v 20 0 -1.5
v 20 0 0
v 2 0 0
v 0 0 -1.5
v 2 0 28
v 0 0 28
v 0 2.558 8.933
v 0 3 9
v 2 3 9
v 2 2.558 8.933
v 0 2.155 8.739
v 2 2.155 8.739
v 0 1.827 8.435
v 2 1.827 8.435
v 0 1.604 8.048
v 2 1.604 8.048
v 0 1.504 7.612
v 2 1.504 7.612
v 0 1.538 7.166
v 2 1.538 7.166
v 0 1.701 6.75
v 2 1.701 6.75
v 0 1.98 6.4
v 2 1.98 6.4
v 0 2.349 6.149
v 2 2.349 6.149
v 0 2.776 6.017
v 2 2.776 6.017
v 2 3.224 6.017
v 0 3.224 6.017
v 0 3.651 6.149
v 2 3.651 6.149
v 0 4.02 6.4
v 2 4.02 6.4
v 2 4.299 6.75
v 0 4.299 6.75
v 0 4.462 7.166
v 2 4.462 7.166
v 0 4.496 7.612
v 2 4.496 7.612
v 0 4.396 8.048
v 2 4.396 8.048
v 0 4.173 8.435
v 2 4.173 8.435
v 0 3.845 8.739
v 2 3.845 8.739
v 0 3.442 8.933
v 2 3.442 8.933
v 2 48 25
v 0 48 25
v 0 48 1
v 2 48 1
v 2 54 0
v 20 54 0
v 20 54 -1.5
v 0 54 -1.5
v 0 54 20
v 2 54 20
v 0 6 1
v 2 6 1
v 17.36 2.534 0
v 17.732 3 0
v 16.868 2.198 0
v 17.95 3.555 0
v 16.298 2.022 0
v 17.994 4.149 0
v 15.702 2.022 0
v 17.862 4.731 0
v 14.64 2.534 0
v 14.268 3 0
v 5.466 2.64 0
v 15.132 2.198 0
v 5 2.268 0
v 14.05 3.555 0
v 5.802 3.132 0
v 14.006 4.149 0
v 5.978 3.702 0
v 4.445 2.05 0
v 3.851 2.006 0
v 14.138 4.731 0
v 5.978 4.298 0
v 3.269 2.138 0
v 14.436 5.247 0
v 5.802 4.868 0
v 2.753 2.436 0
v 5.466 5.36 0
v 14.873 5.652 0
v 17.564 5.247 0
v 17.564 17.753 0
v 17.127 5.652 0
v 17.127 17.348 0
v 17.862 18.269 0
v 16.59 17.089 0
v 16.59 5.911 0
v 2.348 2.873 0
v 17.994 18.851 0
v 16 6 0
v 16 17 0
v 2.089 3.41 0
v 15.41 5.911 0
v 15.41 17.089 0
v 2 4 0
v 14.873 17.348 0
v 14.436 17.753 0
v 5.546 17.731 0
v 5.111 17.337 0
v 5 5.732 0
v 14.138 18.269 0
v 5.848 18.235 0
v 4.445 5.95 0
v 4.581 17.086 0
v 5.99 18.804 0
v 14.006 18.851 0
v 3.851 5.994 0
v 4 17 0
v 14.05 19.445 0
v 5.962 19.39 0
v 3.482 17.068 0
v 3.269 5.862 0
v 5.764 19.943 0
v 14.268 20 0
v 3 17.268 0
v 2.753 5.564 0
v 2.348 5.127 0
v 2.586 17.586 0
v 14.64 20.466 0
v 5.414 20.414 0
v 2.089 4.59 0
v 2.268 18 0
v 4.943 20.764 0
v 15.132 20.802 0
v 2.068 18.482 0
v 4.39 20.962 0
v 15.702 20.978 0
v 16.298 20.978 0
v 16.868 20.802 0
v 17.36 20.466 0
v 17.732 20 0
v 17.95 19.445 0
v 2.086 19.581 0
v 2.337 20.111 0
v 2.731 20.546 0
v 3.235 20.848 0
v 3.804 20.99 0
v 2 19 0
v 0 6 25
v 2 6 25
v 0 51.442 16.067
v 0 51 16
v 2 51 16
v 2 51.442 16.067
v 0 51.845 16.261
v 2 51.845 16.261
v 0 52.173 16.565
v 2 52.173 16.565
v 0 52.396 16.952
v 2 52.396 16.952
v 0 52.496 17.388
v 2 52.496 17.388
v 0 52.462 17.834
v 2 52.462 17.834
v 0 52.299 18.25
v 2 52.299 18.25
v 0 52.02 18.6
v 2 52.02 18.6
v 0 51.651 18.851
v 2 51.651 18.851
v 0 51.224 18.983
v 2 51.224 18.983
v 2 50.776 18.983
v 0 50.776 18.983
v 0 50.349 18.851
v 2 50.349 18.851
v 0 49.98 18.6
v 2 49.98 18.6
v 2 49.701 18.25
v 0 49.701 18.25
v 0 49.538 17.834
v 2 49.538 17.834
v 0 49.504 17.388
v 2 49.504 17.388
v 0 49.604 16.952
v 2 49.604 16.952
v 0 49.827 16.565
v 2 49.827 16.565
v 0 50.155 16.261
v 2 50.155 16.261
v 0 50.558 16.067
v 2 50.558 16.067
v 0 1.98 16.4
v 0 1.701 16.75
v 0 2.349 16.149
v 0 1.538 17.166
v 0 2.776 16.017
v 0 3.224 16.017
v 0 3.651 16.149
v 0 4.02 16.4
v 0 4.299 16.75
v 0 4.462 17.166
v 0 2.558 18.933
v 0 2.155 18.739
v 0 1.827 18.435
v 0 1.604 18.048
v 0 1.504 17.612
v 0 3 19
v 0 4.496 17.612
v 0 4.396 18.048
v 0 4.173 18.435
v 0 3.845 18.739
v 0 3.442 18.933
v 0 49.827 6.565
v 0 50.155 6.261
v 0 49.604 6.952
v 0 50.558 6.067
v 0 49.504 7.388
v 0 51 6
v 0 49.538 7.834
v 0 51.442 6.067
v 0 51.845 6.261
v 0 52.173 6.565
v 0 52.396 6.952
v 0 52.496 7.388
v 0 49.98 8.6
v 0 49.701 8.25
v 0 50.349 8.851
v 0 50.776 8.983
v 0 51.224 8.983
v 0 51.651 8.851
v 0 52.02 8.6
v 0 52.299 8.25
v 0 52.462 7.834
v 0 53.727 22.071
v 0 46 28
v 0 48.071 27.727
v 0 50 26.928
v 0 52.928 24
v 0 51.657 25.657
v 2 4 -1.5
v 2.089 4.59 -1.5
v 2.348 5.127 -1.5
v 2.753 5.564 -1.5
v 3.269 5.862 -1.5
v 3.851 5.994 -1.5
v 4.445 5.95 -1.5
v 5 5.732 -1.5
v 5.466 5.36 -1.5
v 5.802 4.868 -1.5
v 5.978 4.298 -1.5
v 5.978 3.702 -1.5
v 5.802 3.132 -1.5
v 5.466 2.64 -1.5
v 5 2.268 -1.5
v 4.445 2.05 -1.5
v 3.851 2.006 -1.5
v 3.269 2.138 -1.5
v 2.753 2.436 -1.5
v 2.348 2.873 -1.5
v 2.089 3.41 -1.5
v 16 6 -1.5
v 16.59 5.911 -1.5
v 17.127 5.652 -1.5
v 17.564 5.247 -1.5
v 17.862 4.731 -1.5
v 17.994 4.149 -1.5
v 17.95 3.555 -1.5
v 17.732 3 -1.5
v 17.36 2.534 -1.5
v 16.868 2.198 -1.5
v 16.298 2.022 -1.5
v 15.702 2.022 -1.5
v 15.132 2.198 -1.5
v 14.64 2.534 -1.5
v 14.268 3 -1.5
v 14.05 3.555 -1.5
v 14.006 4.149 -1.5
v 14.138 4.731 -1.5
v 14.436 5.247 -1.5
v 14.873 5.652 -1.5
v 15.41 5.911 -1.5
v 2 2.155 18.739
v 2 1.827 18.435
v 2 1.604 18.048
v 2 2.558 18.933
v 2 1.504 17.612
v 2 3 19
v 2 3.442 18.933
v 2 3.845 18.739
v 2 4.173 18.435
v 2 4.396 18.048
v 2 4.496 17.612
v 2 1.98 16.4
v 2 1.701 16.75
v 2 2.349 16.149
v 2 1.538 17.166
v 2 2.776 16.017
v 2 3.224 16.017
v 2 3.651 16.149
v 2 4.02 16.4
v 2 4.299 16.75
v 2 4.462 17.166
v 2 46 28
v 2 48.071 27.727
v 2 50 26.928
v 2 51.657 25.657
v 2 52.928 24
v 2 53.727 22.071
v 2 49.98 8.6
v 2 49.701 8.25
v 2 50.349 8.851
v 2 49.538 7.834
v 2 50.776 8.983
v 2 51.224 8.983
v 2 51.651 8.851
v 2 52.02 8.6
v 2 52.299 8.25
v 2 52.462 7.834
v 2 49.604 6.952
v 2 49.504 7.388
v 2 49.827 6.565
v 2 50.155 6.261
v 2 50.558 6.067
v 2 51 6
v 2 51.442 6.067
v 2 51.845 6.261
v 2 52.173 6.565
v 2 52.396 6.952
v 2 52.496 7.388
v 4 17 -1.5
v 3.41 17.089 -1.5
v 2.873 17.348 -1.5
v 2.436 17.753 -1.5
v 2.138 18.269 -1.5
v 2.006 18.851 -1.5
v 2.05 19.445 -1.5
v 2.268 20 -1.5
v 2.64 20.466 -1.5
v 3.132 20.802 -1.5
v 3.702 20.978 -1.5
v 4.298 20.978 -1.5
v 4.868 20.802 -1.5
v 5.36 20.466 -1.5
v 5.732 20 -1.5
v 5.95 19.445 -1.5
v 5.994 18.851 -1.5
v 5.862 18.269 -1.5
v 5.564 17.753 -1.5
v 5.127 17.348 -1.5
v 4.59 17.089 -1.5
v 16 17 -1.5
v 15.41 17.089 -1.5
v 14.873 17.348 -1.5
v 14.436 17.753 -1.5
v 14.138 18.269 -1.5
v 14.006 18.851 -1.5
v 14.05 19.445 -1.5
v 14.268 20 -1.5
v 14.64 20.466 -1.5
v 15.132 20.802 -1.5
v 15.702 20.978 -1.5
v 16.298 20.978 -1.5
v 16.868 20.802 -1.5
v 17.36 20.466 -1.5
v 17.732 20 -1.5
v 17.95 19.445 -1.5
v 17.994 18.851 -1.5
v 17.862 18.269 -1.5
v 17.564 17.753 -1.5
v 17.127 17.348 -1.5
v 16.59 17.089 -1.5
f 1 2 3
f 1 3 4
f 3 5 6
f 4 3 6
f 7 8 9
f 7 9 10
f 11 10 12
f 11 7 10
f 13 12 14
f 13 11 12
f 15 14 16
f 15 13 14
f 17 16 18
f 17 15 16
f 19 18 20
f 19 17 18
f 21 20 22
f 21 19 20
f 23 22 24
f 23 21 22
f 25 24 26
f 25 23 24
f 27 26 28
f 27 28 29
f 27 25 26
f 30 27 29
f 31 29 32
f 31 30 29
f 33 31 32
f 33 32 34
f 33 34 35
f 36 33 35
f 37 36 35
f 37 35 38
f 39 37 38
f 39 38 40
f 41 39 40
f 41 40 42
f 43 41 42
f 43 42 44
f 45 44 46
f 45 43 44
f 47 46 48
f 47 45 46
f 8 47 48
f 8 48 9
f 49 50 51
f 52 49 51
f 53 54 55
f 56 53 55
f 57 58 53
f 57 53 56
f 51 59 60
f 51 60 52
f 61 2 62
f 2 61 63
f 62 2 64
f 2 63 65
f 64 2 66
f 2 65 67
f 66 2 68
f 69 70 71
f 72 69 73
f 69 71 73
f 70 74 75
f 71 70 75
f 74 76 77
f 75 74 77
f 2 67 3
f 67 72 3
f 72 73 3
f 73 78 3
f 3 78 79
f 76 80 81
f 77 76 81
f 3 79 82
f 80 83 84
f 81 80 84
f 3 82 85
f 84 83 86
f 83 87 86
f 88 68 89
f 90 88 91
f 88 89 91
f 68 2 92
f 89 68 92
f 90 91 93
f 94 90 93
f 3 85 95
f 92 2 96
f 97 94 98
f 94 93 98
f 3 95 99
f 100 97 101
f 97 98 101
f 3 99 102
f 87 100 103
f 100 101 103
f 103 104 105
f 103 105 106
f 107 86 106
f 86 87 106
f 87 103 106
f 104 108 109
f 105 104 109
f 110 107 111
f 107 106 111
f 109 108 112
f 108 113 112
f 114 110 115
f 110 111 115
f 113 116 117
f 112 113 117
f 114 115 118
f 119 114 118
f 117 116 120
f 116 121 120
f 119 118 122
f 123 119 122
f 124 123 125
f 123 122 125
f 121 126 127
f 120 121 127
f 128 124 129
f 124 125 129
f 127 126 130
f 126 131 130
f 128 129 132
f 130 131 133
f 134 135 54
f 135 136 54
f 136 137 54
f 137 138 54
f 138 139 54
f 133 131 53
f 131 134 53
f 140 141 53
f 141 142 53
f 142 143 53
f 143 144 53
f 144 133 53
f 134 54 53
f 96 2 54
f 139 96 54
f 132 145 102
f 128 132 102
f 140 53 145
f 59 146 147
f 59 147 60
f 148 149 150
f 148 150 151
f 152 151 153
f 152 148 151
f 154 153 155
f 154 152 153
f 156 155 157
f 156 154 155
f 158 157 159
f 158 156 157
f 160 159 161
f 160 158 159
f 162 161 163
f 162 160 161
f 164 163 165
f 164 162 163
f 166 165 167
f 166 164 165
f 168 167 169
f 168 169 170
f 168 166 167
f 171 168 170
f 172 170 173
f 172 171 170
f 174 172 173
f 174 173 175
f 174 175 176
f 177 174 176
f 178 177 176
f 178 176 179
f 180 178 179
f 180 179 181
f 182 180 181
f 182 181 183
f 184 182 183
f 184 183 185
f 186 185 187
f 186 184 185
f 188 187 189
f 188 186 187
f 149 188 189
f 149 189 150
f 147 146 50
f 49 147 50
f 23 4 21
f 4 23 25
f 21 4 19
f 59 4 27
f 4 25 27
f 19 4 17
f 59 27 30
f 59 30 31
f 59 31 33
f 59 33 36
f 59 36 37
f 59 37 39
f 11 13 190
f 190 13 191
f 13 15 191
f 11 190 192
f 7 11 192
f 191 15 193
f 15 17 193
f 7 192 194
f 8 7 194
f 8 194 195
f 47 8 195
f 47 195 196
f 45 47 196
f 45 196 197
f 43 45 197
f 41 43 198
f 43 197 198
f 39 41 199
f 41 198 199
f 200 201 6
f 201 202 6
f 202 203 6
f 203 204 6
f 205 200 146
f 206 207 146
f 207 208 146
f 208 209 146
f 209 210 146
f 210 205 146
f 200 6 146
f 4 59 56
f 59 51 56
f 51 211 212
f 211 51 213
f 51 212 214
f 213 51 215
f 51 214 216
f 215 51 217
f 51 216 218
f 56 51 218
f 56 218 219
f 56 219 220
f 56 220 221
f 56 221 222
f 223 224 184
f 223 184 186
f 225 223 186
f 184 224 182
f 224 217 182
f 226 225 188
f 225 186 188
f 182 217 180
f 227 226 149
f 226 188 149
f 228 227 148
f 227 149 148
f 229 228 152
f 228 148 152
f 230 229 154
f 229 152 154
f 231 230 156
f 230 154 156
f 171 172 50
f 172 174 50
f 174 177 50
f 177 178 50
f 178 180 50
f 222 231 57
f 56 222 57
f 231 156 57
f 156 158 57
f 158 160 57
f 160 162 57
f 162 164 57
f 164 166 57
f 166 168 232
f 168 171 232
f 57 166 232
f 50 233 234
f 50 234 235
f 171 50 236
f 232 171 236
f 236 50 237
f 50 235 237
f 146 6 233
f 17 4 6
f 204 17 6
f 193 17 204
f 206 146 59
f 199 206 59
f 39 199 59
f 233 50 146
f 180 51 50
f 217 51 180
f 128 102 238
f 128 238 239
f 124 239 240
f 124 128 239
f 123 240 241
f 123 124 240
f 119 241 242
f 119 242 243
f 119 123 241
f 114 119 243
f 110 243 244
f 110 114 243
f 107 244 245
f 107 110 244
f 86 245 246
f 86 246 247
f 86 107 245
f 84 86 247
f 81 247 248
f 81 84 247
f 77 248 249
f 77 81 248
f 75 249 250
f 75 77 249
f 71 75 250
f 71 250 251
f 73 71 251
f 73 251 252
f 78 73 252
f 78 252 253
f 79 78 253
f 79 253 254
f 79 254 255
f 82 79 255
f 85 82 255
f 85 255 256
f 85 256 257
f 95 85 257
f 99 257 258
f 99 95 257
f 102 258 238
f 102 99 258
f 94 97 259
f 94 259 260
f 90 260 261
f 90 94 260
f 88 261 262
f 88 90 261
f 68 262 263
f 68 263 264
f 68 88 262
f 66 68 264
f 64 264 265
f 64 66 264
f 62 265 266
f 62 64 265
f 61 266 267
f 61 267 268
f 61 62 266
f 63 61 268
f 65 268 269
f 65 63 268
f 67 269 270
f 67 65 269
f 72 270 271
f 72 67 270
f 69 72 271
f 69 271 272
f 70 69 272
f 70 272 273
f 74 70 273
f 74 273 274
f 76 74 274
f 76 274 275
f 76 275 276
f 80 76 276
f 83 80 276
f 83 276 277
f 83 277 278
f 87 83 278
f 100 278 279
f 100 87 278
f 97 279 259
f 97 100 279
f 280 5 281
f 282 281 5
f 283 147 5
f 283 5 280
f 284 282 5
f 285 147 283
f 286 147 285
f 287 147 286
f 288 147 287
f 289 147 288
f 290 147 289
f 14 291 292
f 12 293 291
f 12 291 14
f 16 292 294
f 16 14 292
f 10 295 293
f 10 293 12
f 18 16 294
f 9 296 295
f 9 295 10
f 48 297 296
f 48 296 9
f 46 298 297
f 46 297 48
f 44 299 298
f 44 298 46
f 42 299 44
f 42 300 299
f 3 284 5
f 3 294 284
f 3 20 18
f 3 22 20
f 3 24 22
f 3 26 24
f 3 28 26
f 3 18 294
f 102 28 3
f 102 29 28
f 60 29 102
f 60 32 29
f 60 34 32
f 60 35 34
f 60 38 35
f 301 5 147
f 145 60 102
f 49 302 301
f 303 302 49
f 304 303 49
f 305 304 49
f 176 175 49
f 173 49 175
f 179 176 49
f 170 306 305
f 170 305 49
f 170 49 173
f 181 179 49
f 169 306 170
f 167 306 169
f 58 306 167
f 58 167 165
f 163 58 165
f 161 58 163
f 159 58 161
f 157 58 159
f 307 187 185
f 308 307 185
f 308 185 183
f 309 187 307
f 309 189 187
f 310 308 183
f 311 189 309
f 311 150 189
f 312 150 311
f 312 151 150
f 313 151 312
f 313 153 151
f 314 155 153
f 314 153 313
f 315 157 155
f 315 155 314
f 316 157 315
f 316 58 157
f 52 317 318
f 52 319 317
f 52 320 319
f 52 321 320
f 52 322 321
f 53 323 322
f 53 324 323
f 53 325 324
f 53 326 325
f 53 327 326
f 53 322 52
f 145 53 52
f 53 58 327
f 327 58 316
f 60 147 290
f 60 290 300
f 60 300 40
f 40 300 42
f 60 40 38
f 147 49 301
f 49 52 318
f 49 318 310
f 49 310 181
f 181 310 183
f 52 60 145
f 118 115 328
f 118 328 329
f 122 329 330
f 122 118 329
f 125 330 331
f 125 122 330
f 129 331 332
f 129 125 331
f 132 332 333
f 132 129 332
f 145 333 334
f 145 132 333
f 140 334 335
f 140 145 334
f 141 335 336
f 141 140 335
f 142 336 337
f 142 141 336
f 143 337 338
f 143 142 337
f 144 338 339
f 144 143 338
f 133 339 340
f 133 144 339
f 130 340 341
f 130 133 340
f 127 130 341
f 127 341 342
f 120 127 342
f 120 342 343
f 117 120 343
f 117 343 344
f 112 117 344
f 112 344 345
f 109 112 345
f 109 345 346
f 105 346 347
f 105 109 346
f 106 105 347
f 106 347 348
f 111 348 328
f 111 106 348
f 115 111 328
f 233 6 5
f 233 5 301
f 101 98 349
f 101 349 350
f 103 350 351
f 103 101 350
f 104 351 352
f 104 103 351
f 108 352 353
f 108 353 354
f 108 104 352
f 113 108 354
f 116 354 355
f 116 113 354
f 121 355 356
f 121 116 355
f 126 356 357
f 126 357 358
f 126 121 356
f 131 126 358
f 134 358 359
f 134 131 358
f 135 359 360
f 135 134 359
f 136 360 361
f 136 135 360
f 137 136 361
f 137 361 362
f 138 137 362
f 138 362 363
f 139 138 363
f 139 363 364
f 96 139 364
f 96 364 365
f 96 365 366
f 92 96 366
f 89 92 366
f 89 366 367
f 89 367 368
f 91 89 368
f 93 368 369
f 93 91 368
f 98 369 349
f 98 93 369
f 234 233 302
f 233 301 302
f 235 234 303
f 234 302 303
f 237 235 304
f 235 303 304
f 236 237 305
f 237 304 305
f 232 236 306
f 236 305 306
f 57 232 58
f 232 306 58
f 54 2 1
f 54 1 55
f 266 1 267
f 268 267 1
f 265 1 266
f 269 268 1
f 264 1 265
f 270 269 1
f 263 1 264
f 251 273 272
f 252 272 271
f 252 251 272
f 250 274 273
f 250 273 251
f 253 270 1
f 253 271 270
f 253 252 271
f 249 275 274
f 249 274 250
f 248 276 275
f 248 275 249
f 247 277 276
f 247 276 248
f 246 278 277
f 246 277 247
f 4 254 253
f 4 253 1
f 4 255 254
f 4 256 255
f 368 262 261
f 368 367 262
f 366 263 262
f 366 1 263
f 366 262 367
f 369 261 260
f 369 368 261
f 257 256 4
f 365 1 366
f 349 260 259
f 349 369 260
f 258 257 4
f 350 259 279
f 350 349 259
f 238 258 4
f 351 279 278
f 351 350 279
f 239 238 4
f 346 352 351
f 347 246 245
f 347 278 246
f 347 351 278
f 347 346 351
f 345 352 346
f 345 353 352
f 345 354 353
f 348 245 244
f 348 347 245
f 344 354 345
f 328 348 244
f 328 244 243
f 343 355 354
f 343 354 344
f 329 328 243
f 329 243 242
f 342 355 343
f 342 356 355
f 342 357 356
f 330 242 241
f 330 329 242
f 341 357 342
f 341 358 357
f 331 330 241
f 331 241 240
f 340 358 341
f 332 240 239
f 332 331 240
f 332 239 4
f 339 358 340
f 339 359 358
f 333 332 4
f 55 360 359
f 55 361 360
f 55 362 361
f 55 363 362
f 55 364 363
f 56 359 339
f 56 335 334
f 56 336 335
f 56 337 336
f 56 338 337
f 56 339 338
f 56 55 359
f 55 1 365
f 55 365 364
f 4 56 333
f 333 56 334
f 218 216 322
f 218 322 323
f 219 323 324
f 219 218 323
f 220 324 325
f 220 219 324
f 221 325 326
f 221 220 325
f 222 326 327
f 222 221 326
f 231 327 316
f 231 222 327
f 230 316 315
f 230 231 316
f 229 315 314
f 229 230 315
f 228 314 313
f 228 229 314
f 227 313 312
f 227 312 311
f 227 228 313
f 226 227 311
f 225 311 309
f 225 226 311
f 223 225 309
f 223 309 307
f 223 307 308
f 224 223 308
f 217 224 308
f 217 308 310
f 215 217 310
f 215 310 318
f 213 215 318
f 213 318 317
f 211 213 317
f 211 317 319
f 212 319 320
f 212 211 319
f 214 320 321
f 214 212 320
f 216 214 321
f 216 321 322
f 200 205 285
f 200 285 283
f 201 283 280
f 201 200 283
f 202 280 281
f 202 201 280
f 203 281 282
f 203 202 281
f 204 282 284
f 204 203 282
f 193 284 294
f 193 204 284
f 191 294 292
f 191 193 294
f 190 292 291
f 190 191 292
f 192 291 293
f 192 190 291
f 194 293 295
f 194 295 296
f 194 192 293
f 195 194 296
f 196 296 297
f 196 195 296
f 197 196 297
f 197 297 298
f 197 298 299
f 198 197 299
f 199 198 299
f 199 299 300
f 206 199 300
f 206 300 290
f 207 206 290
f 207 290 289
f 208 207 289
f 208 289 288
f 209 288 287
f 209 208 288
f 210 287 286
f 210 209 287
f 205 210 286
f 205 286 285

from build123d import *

# Parameters (mm, degrees)
SKETCH_1_W      = 28
SKETCH_1_H      = 54
SKETCH_1_R      = 1.5
SKETCH_1_W_2    = 24
SKETCH_1_H_2    = 42
EXTRUDE_1_DEPTH = 2
SKETCH_2_W      = 20
SKETCH_2_H      = 54
SKETCH_2_R      = 2
EXTRUDE_2_DEPTH = 1.5
FILLET_1_R      = 8


with BuildPart() as part:
    # 草图1 → 凸台-拉伸1 (new body)
    with BuildSketch(Plane(origin=(0, 0, 0), x_dir=(0, 0, -1), z_dir=(1, 0, 0))):
        with Locations((-14, 27)):
            Rectangle(SKETCH_1_W, SKETCH_1_H)
        with Locations((-7.5, 51)):
            Circle(SKETCH_1_R, mode=Mode.SUBTRACT)
        with Locations((-17.5, 51)):
            Circle(SKETCH_1_R, mode=Mode.SUBTRACT)
        with Locations(Location((-7.5, 3, 0), (0, 0, 180))):
            Circle(SKETCH_1_R, mode=Mode.SUBTRACT)
        with Locations(Location((-17.5, 3, 0), (0, 0, 180))):
            Circle(SKETCH_1_R, mode=Mode.SUBTRACT)
        with Locations((-13, 27)):
            Rectangle(SKETCH_1_W_2, SKETCH_1_H_2, mode=Mode.SUBTRACT)
    extrude(amount=EXTRUDE_1_DEPTH)

    # 草图2 → 凸台-拉伸2 (add)
    with BuildSketch(Plane(origin=(0, 0, 0), x_dir=(-1, 0, 0), z_dir=(0, 0, -1))):
        with Locations((-10, 27)):
            Rectangle(SKETCH_2_W, SKETCH_2_H)
        with Locations(Location((-16, 4, 0), (0, 0, 90))):
            Circle(SKETCH_2_R, mode=Mode.SUBTRACT)
        with Locations((-4, 4)):
            Circle(SKETCH_2_R, mode=Mode.SUBTRACT)
        with Locations(Location((-4, 19, 0), (0, 0, 270))):
            Circle(SKETCH_2_R, mode=Mode.SUBTRACT)
        with Locations(Location((-16, 19, 0), (0, 0, 270))):
            Circle(SKETCH_2_R, mode=Mode.SUBTRACT)
    extrude(amount=EXTRUDE_2_DEPTH)

    # 圆角1
    fillet_1_edges = [part.edges().sort_by_distance(p)[0] for p in [
        (1, 54, 28),
    ]]
    fillet(fillet_1_edges, radius=FILLET_1_R)


solid = part.part
